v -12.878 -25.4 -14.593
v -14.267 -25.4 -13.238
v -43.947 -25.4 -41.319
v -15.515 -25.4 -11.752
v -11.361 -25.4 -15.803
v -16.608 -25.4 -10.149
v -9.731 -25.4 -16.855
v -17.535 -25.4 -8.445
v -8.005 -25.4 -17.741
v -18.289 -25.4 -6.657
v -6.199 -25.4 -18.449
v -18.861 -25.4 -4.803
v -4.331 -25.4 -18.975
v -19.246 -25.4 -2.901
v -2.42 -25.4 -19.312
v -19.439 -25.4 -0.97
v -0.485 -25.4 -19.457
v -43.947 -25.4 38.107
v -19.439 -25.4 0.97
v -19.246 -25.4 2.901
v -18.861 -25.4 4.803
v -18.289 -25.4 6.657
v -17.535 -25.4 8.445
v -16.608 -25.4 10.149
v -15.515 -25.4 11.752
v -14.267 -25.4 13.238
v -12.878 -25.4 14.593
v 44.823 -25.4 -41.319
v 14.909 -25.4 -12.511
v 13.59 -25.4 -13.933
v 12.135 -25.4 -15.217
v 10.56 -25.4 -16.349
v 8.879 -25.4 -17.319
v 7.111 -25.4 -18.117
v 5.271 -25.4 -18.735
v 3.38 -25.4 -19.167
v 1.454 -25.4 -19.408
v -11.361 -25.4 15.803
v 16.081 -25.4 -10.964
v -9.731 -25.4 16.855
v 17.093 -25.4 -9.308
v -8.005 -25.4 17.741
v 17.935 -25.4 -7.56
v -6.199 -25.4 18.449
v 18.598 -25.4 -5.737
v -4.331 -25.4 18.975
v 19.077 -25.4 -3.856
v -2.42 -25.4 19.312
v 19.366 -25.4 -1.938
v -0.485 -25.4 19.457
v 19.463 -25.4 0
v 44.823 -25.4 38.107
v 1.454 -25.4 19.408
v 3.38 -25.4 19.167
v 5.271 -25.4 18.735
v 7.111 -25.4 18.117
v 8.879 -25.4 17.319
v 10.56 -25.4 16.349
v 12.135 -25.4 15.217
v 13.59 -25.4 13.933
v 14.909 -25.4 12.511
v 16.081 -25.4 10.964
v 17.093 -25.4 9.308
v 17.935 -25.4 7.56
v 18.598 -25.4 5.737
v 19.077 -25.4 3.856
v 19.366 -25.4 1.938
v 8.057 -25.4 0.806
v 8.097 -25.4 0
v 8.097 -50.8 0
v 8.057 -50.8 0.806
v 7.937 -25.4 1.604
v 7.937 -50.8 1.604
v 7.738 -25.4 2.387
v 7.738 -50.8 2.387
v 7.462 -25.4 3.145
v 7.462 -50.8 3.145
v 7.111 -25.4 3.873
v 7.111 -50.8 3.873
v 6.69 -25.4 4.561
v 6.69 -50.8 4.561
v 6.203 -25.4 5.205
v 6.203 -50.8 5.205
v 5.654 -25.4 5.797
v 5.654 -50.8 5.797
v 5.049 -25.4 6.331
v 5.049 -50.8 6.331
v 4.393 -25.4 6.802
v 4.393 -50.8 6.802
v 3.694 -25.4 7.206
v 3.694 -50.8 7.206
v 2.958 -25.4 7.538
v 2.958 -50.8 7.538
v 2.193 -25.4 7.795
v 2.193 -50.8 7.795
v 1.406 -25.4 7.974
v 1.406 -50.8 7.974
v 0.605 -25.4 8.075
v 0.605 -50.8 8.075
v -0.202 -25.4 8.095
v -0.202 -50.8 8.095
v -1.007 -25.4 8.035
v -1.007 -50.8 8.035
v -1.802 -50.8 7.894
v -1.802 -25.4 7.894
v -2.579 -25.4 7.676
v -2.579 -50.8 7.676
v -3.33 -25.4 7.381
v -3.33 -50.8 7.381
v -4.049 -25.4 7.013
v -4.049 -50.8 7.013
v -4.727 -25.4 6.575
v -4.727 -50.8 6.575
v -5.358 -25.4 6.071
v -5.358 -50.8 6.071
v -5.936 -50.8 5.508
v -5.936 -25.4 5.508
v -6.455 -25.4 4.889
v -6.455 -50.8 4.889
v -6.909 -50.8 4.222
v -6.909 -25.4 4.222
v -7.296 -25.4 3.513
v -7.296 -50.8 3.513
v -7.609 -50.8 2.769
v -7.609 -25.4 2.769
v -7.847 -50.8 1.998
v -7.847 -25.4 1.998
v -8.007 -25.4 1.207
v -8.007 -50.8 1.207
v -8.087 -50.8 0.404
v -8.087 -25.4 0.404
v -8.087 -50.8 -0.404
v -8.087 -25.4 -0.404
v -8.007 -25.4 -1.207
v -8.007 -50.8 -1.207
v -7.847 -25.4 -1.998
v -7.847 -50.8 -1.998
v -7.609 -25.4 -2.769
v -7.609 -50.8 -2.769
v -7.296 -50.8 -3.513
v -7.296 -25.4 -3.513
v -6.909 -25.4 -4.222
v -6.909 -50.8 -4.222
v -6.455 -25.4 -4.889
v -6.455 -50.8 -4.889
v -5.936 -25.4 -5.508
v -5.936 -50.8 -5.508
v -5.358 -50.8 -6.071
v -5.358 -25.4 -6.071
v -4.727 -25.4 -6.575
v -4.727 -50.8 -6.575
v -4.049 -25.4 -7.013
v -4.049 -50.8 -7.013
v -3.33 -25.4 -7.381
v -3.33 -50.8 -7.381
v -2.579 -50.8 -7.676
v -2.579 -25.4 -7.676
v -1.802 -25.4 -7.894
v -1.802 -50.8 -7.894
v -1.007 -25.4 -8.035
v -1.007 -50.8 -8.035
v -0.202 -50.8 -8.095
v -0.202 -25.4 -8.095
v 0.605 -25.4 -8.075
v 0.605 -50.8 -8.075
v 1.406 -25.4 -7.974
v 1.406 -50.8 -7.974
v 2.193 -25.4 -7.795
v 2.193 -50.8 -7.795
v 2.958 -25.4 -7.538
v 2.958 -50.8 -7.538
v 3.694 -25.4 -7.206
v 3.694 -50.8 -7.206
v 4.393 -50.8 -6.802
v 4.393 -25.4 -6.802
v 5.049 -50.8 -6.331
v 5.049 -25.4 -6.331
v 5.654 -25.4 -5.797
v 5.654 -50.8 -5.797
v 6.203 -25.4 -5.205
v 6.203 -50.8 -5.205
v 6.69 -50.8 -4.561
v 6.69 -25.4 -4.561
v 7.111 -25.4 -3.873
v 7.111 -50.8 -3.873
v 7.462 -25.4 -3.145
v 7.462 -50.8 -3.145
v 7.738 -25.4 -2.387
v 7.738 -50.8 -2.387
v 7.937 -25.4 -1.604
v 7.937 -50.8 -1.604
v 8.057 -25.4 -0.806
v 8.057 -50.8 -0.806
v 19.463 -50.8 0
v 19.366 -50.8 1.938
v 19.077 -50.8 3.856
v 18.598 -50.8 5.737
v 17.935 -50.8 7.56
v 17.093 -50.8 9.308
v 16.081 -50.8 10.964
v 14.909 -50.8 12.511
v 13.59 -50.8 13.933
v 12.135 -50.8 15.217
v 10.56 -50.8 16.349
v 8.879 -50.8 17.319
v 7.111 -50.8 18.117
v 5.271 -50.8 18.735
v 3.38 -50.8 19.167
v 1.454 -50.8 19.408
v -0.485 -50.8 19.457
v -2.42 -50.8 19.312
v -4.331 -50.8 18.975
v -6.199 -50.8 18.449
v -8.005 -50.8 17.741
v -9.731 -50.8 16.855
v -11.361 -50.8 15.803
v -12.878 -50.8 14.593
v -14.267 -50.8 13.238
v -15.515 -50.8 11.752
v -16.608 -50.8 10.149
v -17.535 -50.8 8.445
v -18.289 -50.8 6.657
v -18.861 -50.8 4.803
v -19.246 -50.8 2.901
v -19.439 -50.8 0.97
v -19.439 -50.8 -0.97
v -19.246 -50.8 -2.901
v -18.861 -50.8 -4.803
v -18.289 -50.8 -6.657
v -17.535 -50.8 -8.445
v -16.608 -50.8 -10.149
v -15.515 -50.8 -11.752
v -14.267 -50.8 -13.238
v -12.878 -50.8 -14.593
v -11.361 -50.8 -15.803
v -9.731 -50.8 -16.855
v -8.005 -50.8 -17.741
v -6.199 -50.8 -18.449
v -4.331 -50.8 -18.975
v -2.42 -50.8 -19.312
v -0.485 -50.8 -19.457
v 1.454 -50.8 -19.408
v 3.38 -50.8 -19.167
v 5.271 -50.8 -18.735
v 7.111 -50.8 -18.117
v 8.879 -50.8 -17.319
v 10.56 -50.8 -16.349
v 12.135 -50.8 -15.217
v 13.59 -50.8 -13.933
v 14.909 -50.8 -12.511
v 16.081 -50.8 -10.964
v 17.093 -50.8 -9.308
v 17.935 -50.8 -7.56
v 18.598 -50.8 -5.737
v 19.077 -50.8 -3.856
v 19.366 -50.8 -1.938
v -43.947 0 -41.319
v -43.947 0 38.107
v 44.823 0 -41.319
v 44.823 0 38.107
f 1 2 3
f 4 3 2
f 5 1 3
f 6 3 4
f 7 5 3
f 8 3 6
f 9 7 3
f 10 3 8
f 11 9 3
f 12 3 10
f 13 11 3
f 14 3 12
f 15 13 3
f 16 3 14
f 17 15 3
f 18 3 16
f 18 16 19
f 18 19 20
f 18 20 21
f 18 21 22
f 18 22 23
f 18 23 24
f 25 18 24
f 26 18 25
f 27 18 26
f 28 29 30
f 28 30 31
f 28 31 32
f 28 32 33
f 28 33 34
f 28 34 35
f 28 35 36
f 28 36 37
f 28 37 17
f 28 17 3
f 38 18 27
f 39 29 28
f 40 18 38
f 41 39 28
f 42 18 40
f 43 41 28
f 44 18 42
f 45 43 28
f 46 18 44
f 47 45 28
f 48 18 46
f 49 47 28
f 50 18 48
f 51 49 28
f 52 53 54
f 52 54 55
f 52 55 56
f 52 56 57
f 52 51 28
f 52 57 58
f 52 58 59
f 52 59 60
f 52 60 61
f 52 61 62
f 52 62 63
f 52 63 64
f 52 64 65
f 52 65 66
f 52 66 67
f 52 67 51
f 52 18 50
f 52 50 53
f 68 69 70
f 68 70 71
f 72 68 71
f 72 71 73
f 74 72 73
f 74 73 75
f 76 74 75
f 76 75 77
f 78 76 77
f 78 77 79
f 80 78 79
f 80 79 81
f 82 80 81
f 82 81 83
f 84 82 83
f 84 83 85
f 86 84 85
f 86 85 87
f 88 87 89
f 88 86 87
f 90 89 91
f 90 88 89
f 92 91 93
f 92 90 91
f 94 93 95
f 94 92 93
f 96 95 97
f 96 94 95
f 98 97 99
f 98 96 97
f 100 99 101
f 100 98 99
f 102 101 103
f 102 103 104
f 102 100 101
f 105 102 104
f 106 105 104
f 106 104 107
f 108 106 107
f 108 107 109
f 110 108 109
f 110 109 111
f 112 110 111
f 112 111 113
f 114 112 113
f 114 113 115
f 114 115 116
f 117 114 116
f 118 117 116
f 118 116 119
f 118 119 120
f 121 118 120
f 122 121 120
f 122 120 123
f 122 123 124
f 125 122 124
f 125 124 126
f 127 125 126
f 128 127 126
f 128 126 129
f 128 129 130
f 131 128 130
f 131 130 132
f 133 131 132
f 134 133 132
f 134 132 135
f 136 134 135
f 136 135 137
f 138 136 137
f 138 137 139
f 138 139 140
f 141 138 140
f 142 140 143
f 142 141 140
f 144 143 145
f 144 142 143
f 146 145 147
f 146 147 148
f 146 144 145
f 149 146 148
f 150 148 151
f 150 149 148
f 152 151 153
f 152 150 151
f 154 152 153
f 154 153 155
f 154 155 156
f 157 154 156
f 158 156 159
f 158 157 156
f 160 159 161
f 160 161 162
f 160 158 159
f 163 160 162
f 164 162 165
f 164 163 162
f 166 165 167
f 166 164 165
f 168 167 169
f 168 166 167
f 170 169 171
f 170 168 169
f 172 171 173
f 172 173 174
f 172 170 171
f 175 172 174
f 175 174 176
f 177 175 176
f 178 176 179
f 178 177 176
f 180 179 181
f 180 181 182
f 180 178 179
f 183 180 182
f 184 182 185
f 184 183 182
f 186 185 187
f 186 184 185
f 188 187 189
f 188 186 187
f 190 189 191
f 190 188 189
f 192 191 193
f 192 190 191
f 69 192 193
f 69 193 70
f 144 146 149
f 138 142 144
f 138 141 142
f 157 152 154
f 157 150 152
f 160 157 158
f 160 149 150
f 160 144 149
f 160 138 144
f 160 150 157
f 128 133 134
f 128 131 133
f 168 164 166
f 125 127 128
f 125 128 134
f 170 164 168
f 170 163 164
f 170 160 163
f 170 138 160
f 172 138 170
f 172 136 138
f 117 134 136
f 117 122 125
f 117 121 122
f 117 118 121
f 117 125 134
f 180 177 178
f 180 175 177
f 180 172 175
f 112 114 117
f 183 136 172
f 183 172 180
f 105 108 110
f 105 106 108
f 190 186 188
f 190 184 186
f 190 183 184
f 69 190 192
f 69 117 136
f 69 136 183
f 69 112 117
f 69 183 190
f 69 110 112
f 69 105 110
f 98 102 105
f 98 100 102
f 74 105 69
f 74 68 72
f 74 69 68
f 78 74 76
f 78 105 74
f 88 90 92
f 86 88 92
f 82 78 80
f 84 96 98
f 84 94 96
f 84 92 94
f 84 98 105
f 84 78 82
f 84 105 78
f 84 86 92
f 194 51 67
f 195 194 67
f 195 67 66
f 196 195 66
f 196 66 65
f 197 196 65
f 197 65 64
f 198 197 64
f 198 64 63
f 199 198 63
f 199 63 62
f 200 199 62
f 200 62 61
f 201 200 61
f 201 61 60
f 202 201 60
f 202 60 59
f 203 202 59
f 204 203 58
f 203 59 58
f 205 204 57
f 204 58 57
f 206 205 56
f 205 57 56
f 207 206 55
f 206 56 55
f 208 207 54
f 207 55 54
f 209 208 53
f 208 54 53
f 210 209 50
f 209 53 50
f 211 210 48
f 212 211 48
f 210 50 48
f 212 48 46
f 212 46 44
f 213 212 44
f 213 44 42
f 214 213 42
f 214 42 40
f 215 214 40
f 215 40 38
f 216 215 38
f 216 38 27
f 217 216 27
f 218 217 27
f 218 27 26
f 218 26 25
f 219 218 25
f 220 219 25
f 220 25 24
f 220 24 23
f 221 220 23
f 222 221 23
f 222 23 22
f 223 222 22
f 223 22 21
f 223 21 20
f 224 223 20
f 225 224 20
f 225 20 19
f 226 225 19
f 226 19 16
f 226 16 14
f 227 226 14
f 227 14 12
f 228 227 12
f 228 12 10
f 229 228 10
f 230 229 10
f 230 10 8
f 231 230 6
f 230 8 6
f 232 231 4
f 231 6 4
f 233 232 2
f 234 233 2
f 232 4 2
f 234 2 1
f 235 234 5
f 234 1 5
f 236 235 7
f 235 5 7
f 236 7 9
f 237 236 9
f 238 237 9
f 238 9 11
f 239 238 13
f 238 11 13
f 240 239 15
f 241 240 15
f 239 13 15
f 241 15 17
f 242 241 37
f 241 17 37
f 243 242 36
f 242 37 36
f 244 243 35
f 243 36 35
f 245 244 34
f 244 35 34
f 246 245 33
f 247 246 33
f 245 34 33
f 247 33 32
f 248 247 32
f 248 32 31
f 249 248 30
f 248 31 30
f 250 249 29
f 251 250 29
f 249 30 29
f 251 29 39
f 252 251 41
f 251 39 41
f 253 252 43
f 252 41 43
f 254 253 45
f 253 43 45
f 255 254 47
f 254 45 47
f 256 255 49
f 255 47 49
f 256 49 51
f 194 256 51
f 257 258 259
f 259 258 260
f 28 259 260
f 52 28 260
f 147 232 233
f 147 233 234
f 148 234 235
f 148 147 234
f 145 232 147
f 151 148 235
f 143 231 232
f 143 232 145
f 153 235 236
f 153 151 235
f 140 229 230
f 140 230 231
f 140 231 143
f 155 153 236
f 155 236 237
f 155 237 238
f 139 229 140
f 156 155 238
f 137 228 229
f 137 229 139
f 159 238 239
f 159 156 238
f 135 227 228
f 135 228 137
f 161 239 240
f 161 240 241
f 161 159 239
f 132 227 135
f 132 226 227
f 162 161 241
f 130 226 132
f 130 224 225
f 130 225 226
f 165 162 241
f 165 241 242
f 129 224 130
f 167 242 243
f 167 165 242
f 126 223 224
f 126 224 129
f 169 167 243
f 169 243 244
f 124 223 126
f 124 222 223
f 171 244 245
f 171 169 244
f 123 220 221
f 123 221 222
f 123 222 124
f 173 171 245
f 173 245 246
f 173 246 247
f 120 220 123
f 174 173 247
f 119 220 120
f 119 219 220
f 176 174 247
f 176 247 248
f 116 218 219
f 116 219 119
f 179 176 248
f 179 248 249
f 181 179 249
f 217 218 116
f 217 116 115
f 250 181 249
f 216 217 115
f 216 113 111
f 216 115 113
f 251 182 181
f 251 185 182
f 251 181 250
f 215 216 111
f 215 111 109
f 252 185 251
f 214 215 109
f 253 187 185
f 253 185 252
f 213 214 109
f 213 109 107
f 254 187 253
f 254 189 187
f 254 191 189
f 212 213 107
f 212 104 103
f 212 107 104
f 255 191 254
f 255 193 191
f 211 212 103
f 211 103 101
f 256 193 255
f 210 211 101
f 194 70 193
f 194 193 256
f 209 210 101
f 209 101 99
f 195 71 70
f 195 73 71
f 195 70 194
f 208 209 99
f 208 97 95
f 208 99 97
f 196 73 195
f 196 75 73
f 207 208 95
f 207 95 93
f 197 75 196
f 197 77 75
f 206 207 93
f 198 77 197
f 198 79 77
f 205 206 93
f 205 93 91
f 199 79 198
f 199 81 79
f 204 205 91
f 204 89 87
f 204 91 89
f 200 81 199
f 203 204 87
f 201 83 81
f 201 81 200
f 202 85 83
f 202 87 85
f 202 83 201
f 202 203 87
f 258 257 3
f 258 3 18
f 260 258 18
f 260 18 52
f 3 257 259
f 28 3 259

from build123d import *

# Parameters (mm, degrees)
F0_R     = 19.4628925801
F0_R_2   = 14.0890060642
F0_R_3   = 8.0974467075
F1_DEPTH = 50.8
F2_W     = 88.7702181935
F2_H     = 79.4259868562
F3_DEPTH = 25.4


with BuildPart() as f1:
    # F0 (on Front) → F1 (new body)
    with BuildSketch(Plane.XZ):
        Circle(F0_R)
        Circle(F0_R_2, mode=Mode.SUBTRACT)
        Circle(F0_R_2)
        Circle(F0_R_3, mode=Mode.SUBTRACT)
    extrude(amount=F1_DEPTH)

    # F2 (on Front) → F3 (join)
    with BuildSketch(Plane.XZ):
        with Locations((0.4380121827, -1.6060378402)):
            Rectangle(F2_W, F2_H)
    extrude(amount=F3_DEPTH)


solid = f1.part
